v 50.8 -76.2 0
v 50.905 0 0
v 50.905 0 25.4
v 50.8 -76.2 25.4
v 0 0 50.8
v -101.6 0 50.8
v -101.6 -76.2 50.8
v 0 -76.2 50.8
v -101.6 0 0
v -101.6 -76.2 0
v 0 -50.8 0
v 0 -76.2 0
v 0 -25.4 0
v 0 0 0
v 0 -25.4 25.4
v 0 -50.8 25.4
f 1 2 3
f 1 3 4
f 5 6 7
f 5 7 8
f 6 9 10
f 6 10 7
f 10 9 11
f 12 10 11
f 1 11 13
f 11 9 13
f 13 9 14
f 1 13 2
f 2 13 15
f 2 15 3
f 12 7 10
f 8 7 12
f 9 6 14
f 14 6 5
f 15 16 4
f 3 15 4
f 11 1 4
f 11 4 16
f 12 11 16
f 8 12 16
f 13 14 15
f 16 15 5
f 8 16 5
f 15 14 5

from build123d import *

# Parameters (mm, degrees)
F0_W     = 101.6
F0_H     = 50.8
F1_DEPTH = 76.2
F3_DEPTH = 25.4


with BuildPart() as f1:
    # F0 (on Front) → F1 (new body)
    with BuildSketch(Plane.XZ):
        with Locations((-50.8, 25.4)):
            Rectangle(F0_W, F0_H)
    extrude(amount=F1_DEPTH)

    # F2 (on face) → F3 (join)
    with BuildSketch(Plane(origin=(0, 0, 0), x_dir=(1, 0, 0), z_dir=(0, 0, -1))):
        Polygon((0, 50.8), (0, 25.4), (50.9050786495, 0), (50.8, 76.2), align=None)
    extrude(amount=-F3_DEPTH)


solid = f1.part
